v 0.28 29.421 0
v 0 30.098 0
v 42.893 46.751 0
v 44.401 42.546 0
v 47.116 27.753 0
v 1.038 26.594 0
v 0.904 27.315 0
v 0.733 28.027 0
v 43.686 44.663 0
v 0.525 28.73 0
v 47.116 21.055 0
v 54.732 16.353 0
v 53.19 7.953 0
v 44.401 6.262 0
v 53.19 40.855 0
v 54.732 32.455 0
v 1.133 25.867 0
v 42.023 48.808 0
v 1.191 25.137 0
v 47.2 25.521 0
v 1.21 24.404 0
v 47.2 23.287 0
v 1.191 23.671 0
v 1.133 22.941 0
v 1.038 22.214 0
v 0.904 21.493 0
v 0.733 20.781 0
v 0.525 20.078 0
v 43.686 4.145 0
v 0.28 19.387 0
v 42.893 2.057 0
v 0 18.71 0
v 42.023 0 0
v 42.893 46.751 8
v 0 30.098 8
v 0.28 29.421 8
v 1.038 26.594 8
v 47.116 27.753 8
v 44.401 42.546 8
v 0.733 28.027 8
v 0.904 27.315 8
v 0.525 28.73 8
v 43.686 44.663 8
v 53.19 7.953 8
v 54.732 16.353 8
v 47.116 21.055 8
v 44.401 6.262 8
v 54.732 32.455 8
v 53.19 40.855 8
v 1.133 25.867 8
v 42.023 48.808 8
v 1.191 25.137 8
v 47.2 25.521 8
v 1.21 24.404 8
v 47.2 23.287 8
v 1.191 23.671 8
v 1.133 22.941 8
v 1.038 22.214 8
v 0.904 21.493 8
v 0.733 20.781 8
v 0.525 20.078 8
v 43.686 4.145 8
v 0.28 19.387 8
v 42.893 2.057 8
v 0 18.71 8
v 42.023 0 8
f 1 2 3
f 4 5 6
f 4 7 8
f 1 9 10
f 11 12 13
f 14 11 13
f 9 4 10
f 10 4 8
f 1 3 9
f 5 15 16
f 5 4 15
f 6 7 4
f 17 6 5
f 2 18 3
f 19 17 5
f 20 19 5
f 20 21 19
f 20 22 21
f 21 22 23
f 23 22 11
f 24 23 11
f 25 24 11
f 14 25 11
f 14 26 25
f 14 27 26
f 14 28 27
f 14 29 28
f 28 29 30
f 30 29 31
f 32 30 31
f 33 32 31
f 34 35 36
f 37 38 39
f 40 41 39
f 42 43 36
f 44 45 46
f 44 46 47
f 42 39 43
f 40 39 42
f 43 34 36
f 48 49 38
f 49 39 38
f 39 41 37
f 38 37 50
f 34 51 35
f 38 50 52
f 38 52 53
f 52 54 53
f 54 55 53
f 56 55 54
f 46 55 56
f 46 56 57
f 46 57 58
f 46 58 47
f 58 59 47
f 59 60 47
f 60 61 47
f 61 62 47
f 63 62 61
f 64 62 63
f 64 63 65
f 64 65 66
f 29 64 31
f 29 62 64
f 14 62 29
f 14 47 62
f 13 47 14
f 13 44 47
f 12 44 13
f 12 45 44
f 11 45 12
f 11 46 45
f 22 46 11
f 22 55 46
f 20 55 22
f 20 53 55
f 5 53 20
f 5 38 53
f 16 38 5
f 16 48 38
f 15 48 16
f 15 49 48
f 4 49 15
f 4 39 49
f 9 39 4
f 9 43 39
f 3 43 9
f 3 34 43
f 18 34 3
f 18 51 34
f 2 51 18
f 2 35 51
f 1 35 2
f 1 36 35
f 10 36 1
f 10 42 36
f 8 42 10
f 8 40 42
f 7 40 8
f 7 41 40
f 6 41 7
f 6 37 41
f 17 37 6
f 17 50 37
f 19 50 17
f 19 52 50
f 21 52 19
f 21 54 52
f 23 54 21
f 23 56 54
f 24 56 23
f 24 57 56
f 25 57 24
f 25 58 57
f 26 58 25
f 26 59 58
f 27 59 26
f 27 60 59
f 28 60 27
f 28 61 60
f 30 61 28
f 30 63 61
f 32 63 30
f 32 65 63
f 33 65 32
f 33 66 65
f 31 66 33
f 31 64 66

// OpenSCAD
$fn = 32;

// ----------------------------------------------------------------------
// Gear sector: 2 teeth on 48 degrees
// ----------------------------------------------------------------------

// --- parameters (mm) ---
sector_angle = 48;        // sector angle, degrees
root_r = 60;              // root circle radius
tooth_h = 8;              // tooth height over the root circle
teeth = 2;                // number of teeth on the sector
hub_r = 14;               // hub bore radius
plate_t = 8;              // sector thickness, Z
arc_step = 3;             // sampling step of the root/hub arcs, degrees

tip_r = root_r + tooth_h;  // tip circle radius

profile = [[42.023, 0], [42.893, 2.057], [43.686, 4.145], [44.401, 6.262], [53.19, 7.953], [54.732, 16.353], [47.116, 21.055], [47.2, 23.287], [47.2, 25.521], [47.116, 27.753], [54.732, 32.455], [53.19, 40.855], [44.401, 42.546], [43.686, 44.663], [42.893, 46.751], [42.023, 48.808], [0, 30.098], [0.28, 29.421], [0.525, 28.73], [0.733, 28.027], [0.904, 27.315], [1.038, 26.594], [1.133, 25.867], [1.191, 25.137], [1.21, 24.404], [1.191, 23.671], [1.133, 22.941], [1.038, 22.214], [0.904, 21.493], [0.733, 20.781], [0.525, 20.078], [0.28, 19.387], [0, 18.71]];  // primary outline, 33 points, counter clockwise

// --- the one profile operation ---
linear_extrude(height = plate_t) polygon(points = profile);
